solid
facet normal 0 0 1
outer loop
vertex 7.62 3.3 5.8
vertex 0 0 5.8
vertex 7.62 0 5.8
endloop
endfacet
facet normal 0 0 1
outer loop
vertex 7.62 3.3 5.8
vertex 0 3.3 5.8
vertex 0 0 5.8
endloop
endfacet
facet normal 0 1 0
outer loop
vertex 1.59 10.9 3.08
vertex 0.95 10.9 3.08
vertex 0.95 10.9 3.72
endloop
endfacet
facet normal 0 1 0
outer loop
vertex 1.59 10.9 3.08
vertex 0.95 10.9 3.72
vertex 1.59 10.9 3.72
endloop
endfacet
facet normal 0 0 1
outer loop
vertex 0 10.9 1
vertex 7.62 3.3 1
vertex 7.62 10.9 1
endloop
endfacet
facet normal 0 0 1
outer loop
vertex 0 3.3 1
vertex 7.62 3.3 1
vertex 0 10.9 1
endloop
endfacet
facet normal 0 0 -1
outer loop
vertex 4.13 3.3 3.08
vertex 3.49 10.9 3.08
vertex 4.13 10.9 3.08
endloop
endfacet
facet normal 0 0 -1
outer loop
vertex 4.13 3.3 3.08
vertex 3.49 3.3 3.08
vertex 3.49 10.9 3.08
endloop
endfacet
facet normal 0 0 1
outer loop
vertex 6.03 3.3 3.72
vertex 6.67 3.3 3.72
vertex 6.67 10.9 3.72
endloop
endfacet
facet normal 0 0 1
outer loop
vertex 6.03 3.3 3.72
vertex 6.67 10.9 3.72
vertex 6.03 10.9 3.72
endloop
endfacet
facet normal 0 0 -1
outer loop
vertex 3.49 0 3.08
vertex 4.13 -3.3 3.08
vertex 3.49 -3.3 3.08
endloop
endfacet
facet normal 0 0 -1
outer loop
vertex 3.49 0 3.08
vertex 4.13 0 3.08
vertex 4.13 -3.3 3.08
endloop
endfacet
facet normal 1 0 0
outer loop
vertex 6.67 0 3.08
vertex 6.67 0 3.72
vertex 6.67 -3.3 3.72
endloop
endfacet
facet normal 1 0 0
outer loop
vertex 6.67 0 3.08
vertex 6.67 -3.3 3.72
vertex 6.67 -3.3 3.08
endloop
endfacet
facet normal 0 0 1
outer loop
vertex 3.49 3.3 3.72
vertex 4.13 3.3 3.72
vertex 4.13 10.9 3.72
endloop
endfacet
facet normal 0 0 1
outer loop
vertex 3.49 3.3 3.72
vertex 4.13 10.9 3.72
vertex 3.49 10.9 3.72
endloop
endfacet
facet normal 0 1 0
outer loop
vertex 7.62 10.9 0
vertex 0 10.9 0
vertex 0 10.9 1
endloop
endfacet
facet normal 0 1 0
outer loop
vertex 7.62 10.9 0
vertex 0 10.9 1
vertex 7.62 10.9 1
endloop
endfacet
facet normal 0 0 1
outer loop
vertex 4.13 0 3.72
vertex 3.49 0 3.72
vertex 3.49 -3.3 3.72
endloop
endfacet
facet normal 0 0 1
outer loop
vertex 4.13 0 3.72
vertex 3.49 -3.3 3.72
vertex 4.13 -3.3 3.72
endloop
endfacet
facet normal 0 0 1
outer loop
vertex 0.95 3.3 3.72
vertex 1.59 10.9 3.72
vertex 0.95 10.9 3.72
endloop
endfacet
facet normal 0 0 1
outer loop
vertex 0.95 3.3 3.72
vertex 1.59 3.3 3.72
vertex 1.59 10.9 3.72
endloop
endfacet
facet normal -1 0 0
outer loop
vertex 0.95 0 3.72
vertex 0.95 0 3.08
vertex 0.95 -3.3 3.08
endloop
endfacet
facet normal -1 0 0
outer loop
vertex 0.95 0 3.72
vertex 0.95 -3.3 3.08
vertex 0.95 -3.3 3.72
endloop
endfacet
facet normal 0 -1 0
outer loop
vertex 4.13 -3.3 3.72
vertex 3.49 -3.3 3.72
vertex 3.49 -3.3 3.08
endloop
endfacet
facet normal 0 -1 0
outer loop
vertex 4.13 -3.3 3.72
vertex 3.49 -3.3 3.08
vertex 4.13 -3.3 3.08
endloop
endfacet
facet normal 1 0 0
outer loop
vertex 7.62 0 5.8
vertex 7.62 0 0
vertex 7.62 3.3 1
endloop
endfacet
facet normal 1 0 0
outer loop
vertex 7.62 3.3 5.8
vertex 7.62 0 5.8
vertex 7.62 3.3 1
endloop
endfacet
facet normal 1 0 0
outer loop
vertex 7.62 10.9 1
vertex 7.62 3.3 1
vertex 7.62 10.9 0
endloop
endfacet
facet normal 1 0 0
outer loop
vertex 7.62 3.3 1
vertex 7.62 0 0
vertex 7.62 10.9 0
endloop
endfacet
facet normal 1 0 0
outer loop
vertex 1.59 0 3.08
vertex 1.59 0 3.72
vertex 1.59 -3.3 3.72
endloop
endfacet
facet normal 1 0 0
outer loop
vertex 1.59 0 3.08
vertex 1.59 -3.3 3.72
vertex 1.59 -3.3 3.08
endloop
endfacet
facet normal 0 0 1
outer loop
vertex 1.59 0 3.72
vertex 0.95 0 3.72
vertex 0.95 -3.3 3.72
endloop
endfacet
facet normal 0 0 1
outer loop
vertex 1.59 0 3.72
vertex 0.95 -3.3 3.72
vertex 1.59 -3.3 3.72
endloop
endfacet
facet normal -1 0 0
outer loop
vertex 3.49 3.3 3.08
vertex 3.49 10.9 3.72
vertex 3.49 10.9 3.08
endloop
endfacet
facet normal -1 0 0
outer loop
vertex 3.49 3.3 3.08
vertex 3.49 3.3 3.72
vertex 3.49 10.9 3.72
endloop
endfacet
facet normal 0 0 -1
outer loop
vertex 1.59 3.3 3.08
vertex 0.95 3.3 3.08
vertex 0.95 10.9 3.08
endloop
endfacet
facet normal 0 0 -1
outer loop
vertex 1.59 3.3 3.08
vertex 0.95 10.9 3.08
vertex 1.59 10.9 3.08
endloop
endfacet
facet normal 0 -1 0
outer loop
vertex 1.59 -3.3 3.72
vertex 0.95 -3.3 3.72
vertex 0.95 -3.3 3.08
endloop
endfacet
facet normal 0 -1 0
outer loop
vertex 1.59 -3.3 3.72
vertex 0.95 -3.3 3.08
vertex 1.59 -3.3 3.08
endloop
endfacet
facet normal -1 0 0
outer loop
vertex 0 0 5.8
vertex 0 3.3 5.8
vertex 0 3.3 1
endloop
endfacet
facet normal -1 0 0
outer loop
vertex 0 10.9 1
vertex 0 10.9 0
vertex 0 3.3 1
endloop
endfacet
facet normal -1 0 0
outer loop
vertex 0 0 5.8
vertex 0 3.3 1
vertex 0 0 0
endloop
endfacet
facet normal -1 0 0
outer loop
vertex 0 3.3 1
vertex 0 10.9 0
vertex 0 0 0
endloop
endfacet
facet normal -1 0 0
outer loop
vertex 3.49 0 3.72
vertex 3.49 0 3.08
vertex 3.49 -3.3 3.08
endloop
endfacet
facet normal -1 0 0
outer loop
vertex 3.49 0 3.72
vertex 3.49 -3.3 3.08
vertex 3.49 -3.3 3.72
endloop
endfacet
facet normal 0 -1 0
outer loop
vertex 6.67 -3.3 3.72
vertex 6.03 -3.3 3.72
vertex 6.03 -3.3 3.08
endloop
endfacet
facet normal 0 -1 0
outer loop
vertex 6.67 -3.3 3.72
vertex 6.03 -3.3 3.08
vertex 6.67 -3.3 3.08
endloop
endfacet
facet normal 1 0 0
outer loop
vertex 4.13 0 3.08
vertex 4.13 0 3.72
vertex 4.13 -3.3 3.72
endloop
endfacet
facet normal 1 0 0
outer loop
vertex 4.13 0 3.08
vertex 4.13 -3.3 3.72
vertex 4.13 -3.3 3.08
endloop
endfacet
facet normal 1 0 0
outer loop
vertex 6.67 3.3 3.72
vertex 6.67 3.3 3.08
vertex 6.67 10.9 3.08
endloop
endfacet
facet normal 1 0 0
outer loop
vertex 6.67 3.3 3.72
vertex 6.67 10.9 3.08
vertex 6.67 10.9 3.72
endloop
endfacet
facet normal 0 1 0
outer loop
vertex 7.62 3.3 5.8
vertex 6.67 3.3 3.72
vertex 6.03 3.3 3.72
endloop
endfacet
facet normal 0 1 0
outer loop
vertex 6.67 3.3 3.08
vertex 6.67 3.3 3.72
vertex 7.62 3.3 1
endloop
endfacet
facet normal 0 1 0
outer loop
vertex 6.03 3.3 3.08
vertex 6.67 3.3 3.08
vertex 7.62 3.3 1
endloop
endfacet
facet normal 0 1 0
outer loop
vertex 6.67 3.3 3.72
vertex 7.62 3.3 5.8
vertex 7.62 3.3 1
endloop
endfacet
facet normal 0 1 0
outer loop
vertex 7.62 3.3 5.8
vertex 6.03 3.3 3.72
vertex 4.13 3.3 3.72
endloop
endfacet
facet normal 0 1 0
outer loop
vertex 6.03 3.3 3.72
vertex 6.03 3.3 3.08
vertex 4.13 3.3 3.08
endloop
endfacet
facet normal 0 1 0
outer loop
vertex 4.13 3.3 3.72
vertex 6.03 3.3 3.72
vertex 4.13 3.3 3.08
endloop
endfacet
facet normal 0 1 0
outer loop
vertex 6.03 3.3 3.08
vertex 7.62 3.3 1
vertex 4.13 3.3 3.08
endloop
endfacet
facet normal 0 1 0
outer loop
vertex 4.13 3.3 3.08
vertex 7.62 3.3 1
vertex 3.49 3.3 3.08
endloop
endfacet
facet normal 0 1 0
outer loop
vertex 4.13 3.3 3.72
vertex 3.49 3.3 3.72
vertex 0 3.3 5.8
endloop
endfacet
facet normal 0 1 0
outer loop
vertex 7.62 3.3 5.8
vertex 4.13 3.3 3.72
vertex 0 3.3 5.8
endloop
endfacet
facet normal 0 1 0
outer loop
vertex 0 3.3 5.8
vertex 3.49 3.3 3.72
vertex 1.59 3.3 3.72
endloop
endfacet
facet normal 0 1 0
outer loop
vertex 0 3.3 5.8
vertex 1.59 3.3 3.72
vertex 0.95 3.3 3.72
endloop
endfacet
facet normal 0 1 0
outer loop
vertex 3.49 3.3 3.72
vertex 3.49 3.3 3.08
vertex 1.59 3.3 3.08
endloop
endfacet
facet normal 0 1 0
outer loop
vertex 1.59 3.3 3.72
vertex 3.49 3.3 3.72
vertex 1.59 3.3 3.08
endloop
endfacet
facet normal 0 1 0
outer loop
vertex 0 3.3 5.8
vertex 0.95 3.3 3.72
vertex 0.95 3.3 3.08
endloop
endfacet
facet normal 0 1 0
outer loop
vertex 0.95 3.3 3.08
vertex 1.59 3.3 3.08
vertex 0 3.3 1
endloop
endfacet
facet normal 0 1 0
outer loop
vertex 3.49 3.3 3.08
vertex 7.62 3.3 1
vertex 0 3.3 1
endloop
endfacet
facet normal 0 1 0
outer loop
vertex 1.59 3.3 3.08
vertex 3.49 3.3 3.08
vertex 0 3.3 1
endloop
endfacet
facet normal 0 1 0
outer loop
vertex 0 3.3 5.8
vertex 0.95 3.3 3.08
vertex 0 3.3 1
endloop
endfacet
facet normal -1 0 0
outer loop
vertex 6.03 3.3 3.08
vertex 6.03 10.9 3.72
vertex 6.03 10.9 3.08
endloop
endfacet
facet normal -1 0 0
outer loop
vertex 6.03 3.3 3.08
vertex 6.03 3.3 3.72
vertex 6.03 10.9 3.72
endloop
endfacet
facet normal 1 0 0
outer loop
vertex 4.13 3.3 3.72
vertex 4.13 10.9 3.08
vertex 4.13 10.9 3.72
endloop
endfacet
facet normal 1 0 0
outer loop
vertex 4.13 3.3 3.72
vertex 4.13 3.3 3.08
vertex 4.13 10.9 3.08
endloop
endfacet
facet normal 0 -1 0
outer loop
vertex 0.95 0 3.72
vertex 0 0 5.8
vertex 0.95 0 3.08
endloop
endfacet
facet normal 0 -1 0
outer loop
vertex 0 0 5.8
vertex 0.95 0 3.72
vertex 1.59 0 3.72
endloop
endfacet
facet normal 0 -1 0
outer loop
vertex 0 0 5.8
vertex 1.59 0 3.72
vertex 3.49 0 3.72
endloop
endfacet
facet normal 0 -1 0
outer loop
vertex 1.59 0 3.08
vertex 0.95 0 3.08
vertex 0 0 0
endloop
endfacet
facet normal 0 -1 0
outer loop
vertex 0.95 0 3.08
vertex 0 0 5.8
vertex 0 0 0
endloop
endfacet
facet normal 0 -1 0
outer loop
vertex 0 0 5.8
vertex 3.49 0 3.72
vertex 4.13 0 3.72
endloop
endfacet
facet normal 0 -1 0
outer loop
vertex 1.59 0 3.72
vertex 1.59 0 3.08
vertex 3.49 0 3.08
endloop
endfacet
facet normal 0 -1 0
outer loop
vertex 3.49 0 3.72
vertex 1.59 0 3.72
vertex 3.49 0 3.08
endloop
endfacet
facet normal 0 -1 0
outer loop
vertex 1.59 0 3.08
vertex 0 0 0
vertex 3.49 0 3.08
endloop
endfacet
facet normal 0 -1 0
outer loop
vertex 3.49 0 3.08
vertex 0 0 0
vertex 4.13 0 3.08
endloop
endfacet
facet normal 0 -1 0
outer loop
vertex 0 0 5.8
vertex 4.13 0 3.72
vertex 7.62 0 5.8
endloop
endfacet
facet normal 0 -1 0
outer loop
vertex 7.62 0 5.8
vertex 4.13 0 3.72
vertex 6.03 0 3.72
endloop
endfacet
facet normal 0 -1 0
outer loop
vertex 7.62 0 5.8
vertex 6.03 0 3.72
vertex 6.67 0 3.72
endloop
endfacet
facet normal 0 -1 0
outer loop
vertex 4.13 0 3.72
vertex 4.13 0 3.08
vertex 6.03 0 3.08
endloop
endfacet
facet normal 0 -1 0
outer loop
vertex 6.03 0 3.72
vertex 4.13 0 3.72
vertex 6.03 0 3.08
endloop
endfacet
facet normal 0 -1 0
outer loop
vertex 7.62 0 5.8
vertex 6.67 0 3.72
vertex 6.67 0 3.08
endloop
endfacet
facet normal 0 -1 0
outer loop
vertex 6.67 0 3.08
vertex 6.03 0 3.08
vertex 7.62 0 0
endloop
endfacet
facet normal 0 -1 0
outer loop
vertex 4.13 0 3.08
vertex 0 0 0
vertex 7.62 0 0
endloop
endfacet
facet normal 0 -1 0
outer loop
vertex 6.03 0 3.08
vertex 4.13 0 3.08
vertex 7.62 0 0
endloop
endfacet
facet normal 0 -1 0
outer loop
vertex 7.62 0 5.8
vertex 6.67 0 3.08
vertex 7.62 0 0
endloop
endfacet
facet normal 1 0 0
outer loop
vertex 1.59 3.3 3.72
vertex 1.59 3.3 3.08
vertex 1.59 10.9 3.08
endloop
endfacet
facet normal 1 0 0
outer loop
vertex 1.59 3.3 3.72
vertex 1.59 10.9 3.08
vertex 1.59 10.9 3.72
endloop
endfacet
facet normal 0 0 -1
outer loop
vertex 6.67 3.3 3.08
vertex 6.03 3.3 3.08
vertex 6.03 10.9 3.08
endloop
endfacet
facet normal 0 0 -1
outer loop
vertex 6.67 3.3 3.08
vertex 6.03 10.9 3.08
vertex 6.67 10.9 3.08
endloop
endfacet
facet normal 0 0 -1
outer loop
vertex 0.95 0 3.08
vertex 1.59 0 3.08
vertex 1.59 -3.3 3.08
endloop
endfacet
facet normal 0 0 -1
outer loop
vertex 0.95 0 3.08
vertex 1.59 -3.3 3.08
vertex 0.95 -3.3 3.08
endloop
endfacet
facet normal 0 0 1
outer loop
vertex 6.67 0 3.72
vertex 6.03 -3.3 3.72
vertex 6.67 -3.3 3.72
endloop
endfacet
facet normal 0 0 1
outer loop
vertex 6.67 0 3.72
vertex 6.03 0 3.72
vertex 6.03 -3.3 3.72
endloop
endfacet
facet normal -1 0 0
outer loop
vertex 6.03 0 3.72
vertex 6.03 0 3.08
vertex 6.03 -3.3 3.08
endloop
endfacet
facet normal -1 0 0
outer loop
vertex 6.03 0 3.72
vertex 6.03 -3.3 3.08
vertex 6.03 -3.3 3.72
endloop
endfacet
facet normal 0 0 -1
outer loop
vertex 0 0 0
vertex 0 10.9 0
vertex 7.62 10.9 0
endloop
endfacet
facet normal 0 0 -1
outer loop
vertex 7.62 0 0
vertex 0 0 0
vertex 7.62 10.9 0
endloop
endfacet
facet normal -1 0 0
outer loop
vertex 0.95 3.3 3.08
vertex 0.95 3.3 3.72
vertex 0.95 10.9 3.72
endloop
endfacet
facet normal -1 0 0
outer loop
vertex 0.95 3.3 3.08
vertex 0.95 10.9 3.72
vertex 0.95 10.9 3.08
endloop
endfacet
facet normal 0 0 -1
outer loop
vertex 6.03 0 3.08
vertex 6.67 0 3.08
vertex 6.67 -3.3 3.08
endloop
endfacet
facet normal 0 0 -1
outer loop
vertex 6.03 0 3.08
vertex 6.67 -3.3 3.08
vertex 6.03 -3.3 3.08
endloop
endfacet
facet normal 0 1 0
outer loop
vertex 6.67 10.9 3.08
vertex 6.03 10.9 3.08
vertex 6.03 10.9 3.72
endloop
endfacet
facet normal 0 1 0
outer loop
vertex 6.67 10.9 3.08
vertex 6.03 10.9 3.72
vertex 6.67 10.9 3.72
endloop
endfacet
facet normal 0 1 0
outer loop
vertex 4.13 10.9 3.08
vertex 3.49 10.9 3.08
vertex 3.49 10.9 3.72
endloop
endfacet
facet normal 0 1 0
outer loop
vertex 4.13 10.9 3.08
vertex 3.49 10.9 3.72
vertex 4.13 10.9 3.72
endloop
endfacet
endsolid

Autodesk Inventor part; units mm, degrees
ref_plane "YZ Plane" through (0, 0, 0) normal (1, 0, 0) x (0, 1, 0)
ref_plane "XZ Plane" through (0, 0, 0) normal (0, 1, 0) x (-1, 0, 0)
ref_plane "XY Plane" through (0, 0, 0) normal (0, 0, 1) x (1, 0, 0)
sketch "Skizze1" plane through (0, 0, 0) normal (0, 0, 1) x (1, 0, 0)
  line L0 (0, 0) -> (7.62, 0)
  line L1 (7.62, 0) -> (7.62, 3.3)
  line L2 (7.62, 3.3) -> (0, 3.3)
  line L3 (0, 3.3) -> (0, 0)
  dimension "d0" = 7.62
  dimension "d1" = 3.3
extrude "Extrusion1" add sketch "Skizze1" along normal blind 5.8
sketch "Skizze2" plane through (0, 3.3, 0) normal (0, 1, 0) x (1, 0, 0)
  line L0 (7.62, 0) -> (7.62, -5.8) projected
  line L1 (0, 0) -> (7.62, 0)
  line L2 (7.62, 0) -> (7.62, -1)
  line L3 (7.62, -1) -> (0, -1)
  line L4 (0, -1) -> (0, 0)
  dimension "d4" = 1
extrude "Extrusion2" add sketch "Skizze2" along normal blind 7.6
sketch "Skizze3" plane through (0, 3.3, 5.8) normal (0, 1, 0) x (1, 0, 0)
  line L0 (7.62, 4.8) -> (0, 4.8) projected
  line L1 (0, 4.8) -> (0, 0) projected
  line L2 (7.62, 0) -> (0, 0) projected
  line L3 (7.62, 4.8) -> (7.62, 0) projected
  line L4 (0.95, 2.72) -> (1.59, 2.72)
  line L5 (1.59, 2.72) -> (1.59, 2.08)
  line L6 (1.59, 2.08) -> (0.95, 2.08)
  line L7 (0.95, 2.08) -> (0.95, 2.72)
  line L8 (3.49, 2.72) -> (4.13, 2.72)
  line L9 (4.13, 2.72) -> (4.13, 2.08)
  line L10 (4.13, 2.08) -> (3.49, 2.08)
  line L11 (3.49, 2.08) -> (3.49, 2.72)
  line L12 (6.03, 2.72) -> (6.67, 2.72)
  line L13 (6.67, 2.72) -> (6.67, 2.08)
  line L14 (6.67, 2.08) -> (6.03, 2.08)
  line L15 (6.03, 2.08) -> (6.03, 2.72)
  point P0 (0, 5.8)
  dimension "d7" = 0.64
  dimension "d8" = 0.64
  dimension "d9" = 0.64
  dimension "d10" = 0.64
  dimension "d11" = 0.64
  dimension "d12" = 0.64
  dimension "d13" = 7.62
  dimension "d15" = 1.9
  dimension "d16" = 1.9
  dimension "d17" = 0.95
  dimension "d18" = 0.95
  dimension "d19" = 4.8
  dimension "d20" = 2.08
extrude "Extrusion3" add sketch "Skizze3" along normal blind 7.6 contours L4 L5 L6 L7 | L8 L9 L10 L11 | L12 L13 L14 L15
sketch "Skizze4" plane through (0, 0, 0) normal (0, -1, 0) x (1, 0, 0)
  line L0 (7.62, 0) -> (7.62, 5.8) projected
  line L1 (0, 5.8) -> (7.62, 5.8) projected
  line L2 (0, 0) -> (0, 5.8) projected
  line L3 (0.95, 3.72) -> (1.59, 3.72)
  line L4 (1.59, 3.72) -> (1.59, 3.08)
  line L5 (1.59, 3.08) -> (0.95, 3.08)
  line L6 (0.95, 3.08) -> (0.95, 3.72)
  line L7 (3.49, 3.72) -> (4.13, 3.72)
  line L8 (4.13, 3.72) -> (4.13, 3.08)
  line L9 (4.13, 3.08) -> (3.49, 3.08)
  line L10 (3.49, 3.08) -> (3.49, 3.72)
  line L11 (6.03, 3.72) -> (6.67, 3.72)
  line L12 (6.67, 3.72) -> (6.67, 3.08)
  line L13 (6.67, 3.08) -> (6.03, 3.08)
  line L14 (6.03, 3.08) -> (6.03, 3.72)
  dimension "d23" = 0.64
  dimension "d24" = 0.64
  dimension "d25" = 0.64
  dimension "d26" = 0.64
  dimension "d27" = 0.64
  dimension "d28" = 0.64
  dimension "d29" = 0.95
  dimension "d30" = 0.95
  dimension "d31" = 1.9
  dimension "d32" = 1.9
  dimension "d33" = 2.08
  dimension "d34" = 2.08
  dimension "d35" = 2.08
extrude "Extrusion4" add sketch "Skizze4" along normal blind 3.3
properties part number "stiftleiste"
